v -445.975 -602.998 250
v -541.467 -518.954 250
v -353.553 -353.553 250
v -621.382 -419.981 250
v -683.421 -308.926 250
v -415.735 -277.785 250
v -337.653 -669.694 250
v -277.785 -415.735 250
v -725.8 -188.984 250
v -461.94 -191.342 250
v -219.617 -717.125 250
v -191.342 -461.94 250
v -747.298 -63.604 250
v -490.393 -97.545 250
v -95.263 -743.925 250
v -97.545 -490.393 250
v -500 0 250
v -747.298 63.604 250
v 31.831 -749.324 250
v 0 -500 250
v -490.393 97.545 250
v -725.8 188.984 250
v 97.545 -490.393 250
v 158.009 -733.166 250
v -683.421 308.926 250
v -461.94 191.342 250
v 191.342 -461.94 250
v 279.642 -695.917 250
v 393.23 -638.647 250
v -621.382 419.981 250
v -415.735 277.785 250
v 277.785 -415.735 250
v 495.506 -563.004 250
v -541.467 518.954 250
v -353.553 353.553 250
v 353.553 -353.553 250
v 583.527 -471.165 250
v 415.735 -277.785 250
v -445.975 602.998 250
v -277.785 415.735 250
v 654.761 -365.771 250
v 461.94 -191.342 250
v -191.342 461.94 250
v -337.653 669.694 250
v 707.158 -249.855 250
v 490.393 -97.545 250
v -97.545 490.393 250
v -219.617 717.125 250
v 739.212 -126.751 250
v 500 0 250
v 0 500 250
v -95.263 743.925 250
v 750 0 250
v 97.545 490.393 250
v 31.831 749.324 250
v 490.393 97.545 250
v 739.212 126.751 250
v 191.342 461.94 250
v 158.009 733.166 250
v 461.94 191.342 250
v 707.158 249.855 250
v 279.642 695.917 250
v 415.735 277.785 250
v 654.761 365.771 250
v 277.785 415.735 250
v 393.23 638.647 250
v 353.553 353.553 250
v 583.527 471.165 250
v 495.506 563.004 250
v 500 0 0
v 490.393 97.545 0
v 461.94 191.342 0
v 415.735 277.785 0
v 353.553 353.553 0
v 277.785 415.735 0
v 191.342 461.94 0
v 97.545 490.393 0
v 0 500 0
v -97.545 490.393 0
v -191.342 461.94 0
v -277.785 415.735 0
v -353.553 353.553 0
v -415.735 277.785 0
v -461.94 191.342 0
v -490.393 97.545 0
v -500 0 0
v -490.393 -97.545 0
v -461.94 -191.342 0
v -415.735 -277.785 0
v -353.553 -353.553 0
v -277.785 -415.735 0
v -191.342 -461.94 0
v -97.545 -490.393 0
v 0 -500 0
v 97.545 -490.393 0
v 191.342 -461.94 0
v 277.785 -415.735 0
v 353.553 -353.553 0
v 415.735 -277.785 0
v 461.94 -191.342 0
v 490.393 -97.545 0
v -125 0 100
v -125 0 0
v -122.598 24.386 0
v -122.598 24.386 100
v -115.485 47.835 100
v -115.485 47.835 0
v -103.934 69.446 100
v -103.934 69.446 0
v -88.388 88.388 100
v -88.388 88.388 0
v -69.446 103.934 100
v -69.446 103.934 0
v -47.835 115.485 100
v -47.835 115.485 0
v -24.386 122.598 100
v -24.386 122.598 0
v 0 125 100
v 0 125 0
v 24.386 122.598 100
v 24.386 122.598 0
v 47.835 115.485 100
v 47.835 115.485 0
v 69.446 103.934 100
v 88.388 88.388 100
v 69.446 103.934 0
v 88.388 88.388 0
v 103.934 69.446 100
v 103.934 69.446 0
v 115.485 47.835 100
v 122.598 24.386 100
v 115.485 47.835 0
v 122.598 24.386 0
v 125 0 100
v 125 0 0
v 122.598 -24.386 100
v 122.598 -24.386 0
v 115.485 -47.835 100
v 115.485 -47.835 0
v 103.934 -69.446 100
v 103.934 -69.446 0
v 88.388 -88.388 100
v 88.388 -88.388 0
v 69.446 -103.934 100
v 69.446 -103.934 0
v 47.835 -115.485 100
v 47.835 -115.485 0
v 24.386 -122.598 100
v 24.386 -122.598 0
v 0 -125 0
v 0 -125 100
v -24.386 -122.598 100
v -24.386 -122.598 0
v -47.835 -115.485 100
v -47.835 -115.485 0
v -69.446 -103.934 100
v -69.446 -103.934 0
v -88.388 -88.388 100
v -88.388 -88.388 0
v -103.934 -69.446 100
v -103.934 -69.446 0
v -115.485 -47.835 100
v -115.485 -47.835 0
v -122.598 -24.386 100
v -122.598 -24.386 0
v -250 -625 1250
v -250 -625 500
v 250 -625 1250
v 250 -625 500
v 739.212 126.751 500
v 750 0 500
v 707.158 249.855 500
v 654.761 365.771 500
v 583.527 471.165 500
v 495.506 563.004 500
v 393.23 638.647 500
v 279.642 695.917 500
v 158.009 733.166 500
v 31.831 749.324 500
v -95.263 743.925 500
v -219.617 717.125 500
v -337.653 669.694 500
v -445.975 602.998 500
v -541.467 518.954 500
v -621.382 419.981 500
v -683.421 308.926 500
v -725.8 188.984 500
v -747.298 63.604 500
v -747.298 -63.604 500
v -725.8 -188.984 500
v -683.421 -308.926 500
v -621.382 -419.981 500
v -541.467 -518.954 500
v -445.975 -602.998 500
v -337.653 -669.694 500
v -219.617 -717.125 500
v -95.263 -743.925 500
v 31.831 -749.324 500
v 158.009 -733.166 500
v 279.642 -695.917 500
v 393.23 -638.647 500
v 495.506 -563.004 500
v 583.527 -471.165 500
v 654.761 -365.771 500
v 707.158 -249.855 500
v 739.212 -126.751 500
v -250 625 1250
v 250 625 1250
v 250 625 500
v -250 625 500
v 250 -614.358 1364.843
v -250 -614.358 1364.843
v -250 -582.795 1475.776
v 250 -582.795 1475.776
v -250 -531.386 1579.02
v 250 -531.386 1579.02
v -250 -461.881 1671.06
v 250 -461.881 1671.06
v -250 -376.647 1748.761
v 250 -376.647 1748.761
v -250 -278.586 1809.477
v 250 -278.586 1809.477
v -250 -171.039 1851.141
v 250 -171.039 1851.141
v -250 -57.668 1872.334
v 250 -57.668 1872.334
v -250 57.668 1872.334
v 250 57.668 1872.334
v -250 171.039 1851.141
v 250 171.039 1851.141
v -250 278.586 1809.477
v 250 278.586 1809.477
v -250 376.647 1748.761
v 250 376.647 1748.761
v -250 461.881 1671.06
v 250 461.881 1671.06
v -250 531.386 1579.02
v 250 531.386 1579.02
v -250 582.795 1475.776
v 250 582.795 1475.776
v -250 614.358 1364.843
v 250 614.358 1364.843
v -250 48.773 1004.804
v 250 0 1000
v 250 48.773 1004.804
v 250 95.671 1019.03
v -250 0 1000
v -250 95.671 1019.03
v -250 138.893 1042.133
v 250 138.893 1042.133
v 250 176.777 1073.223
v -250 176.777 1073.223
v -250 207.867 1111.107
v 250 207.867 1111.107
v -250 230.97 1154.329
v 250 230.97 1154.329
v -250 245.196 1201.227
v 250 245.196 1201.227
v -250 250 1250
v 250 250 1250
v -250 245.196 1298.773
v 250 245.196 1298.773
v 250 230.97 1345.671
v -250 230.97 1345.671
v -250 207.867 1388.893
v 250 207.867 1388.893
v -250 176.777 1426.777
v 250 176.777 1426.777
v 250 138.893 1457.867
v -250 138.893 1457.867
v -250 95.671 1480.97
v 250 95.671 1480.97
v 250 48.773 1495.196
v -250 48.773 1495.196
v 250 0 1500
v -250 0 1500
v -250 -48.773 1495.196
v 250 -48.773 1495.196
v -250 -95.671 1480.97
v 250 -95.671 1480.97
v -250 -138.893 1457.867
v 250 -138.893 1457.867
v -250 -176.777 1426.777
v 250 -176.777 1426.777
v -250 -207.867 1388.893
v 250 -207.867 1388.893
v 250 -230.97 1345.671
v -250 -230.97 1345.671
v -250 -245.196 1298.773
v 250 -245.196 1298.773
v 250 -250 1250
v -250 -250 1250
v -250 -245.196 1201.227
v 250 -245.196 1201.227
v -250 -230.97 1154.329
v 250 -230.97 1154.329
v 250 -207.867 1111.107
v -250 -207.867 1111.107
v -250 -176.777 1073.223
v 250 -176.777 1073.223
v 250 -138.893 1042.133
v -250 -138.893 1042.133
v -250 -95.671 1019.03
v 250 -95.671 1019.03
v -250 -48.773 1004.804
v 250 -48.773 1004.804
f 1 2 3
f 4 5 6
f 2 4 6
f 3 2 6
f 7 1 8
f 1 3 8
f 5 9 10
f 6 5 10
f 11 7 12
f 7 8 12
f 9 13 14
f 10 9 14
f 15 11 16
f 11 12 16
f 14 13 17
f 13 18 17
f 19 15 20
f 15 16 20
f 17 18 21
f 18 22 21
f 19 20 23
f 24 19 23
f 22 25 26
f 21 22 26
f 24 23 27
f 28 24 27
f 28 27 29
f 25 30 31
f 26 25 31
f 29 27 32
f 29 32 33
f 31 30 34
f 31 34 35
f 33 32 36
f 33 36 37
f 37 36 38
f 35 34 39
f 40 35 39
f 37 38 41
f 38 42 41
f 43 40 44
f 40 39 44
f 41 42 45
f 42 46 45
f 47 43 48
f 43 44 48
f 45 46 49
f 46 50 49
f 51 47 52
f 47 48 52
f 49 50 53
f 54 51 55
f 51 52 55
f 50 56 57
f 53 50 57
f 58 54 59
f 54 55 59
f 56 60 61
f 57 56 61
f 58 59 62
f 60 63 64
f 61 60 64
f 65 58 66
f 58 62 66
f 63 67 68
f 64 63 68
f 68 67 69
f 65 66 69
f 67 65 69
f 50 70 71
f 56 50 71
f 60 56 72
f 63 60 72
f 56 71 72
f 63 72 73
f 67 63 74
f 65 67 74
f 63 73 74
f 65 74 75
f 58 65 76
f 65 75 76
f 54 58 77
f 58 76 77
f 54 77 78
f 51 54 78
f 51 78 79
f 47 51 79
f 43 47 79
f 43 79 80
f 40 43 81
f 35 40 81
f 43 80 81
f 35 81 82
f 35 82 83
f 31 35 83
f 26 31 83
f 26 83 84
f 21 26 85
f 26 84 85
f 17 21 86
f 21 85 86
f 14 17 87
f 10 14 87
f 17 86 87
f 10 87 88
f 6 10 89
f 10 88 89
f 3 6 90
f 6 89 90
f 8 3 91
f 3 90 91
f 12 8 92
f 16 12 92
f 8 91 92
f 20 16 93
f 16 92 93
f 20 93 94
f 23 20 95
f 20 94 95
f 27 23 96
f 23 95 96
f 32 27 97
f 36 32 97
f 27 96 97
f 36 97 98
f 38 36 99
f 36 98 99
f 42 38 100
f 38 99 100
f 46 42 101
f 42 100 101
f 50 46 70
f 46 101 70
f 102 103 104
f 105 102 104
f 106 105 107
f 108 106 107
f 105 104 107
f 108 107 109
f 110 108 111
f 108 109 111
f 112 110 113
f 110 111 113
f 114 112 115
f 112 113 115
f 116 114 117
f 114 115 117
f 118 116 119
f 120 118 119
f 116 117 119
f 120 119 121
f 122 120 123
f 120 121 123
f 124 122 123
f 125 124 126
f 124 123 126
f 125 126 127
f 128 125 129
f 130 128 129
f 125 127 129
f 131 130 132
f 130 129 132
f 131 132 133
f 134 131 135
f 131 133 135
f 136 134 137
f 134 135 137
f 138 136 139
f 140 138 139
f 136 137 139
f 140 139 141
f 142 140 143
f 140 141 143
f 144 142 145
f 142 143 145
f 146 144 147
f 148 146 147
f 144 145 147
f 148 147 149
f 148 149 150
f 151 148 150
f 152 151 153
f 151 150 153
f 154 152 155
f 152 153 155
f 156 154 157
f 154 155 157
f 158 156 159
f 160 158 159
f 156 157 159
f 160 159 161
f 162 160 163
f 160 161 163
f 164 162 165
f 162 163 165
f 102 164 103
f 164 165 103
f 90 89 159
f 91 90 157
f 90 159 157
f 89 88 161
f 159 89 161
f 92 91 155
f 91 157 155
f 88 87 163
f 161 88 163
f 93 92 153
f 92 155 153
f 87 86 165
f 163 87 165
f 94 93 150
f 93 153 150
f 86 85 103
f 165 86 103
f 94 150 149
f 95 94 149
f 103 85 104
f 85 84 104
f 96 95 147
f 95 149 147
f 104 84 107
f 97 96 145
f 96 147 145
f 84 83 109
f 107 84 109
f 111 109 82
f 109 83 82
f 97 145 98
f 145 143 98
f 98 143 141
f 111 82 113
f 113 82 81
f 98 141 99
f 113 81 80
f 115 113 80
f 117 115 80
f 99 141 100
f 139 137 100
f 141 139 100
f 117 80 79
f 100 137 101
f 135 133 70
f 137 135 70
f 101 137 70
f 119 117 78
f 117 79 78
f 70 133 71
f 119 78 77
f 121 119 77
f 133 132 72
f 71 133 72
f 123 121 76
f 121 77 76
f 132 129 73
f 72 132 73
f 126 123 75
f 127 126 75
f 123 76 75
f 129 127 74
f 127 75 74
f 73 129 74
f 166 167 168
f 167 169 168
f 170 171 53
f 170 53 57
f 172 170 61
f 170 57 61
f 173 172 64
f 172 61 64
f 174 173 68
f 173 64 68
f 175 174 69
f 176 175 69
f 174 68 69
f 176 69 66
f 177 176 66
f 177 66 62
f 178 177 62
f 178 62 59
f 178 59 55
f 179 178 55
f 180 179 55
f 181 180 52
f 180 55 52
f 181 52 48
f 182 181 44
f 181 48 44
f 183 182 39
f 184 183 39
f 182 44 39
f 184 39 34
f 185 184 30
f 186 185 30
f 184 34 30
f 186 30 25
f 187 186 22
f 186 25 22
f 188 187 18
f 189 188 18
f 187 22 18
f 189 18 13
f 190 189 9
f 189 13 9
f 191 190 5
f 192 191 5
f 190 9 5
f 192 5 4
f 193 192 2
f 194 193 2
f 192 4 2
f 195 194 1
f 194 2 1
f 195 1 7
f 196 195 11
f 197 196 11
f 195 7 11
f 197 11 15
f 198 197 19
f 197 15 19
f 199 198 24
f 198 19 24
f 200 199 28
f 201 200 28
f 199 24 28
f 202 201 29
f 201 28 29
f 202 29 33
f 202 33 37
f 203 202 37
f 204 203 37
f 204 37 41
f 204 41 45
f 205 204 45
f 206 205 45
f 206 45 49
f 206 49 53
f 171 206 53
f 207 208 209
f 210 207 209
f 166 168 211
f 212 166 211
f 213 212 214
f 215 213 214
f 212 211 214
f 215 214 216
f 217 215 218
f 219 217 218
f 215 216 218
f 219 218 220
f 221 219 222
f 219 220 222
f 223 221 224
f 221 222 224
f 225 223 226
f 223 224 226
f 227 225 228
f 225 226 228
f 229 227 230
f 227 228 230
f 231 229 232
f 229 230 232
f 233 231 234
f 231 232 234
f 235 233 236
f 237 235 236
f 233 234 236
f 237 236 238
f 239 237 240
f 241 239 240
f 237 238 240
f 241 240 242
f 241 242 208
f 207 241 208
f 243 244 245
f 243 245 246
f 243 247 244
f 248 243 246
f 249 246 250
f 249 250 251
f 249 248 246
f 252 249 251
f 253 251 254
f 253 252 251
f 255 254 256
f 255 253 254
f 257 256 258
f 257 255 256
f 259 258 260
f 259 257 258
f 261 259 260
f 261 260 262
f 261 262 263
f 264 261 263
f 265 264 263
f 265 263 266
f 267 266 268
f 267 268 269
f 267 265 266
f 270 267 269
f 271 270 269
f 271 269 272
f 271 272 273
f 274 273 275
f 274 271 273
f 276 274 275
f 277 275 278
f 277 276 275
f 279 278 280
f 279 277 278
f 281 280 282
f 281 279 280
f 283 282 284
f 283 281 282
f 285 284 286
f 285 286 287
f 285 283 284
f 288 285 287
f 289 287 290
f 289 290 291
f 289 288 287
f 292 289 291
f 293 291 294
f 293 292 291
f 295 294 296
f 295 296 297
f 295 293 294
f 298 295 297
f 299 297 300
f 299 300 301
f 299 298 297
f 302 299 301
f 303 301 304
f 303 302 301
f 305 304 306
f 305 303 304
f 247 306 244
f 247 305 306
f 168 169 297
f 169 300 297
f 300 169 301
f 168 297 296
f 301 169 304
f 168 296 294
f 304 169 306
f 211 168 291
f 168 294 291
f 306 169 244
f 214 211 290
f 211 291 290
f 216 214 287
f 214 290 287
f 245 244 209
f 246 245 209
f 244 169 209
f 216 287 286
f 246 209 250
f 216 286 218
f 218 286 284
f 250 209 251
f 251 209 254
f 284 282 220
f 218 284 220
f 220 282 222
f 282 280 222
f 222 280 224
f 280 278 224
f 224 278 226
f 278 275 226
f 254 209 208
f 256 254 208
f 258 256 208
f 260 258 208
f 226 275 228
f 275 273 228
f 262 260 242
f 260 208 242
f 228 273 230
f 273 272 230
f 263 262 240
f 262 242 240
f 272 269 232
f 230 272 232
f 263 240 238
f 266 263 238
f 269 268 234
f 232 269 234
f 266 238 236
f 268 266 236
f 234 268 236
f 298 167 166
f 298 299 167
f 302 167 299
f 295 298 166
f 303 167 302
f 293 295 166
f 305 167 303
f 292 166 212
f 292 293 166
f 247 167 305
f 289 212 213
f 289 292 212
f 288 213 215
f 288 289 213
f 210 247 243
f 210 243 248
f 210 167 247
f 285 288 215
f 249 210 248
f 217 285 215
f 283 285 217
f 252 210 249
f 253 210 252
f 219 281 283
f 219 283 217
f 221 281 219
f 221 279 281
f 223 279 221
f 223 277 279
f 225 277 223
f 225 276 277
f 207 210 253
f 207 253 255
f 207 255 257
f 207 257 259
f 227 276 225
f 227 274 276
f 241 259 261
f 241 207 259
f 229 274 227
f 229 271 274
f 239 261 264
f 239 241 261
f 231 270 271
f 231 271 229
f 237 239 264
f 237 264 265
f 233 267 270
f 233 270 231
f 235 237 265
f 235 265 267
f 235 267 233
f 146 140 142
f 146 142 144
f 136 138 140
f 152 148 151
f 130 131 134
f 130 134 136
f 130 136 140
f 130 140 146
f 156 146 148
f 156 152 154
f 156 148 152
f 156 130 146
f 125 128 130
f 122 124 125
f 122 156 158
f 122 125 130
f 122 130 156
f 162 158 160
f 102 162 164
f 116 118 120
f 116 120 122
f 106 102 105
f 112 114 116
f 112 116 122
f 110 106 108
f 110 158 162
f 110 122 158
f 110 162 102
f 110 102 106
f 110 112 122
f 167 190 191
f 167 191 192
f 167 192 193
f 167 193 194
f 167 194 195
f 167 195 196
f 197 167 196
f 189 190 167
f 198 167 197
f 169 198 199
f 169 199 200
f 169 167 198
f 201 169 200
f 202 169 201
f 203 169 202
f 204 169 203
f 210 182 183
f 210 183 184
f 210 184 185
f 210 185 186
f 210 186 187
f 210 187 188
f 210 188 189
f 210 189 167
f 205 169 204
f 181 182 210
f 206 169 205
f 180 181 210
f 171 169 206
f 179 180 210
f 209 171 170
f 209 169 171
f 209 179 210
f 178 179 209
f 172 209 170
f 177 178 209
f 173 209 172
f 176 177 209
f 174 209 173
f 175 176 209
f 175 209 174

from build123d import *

# Parameters (mm, degrees)
SKETCH1_R           = 500
BOSS_EXTRUDE1_DEPTH = 250
SKETCH3_R           = 125
CUT_EXTRUDE1_DEPTH  = 100
SKETCH4_R           = 750
BOSS_EXTRUDE2_DEPTH = 250
SKETCH5_R           = 250
BOSS_EXTRUDE4_DEPTH = 250


with BuildPart() as part:
    # Sketch1 → Boss-Extrude1 (new body)
    with BuildSketch(Plane.XY):
        Circle(SKETCH1_R)
    extrude(amount=BOSS_EXTRUDE1_DEPTH)

    # Sketch3 → Cut-Extrude1 (cut)
    with BuildSketch(Plane(origin=(0, 0, 0), x_dir=(-1, 0, 0), z_dir=(0, 0, -1))):
        Circle(SKETCH3_R)
    extrude(amount=-CUT_EXTRUDE1_DEPTH, mode=Mode.SUBTRACT)

    # Sketch4 → Boss-Extrude2 (add)
    with BuildSketch(Plane.XY.offset(250)):
        Circle(SKETCH4_R)
    extrude(amount=BOSS_EXTRUDE2_DEPTH)

    # Sketch5 → Boss-Extrude4 (add, symmetric)
    with BuildSketch(Plane(origin=(0, 0, 0), x_dir=(0, 0, -1), z_dir=(1, 0, 0))):
        with BuildLine():
            Line((-1250, 625), (-500, 625))
            Line((-500, 625), (-500, -625))
            Line((-500, -625), (-1250, -625))
            ThreePointArc((-1250, -625), (-1875, 0), (-1250, 625))
        make_face()
        with Locations((-1250, 0)):
            Circle(SKETCH5_R, mode=Mode.SUBTRACT)
    extrude(amount=BOSS_EXTRUDE4_DEPTH, both=True)


solid = part.part
